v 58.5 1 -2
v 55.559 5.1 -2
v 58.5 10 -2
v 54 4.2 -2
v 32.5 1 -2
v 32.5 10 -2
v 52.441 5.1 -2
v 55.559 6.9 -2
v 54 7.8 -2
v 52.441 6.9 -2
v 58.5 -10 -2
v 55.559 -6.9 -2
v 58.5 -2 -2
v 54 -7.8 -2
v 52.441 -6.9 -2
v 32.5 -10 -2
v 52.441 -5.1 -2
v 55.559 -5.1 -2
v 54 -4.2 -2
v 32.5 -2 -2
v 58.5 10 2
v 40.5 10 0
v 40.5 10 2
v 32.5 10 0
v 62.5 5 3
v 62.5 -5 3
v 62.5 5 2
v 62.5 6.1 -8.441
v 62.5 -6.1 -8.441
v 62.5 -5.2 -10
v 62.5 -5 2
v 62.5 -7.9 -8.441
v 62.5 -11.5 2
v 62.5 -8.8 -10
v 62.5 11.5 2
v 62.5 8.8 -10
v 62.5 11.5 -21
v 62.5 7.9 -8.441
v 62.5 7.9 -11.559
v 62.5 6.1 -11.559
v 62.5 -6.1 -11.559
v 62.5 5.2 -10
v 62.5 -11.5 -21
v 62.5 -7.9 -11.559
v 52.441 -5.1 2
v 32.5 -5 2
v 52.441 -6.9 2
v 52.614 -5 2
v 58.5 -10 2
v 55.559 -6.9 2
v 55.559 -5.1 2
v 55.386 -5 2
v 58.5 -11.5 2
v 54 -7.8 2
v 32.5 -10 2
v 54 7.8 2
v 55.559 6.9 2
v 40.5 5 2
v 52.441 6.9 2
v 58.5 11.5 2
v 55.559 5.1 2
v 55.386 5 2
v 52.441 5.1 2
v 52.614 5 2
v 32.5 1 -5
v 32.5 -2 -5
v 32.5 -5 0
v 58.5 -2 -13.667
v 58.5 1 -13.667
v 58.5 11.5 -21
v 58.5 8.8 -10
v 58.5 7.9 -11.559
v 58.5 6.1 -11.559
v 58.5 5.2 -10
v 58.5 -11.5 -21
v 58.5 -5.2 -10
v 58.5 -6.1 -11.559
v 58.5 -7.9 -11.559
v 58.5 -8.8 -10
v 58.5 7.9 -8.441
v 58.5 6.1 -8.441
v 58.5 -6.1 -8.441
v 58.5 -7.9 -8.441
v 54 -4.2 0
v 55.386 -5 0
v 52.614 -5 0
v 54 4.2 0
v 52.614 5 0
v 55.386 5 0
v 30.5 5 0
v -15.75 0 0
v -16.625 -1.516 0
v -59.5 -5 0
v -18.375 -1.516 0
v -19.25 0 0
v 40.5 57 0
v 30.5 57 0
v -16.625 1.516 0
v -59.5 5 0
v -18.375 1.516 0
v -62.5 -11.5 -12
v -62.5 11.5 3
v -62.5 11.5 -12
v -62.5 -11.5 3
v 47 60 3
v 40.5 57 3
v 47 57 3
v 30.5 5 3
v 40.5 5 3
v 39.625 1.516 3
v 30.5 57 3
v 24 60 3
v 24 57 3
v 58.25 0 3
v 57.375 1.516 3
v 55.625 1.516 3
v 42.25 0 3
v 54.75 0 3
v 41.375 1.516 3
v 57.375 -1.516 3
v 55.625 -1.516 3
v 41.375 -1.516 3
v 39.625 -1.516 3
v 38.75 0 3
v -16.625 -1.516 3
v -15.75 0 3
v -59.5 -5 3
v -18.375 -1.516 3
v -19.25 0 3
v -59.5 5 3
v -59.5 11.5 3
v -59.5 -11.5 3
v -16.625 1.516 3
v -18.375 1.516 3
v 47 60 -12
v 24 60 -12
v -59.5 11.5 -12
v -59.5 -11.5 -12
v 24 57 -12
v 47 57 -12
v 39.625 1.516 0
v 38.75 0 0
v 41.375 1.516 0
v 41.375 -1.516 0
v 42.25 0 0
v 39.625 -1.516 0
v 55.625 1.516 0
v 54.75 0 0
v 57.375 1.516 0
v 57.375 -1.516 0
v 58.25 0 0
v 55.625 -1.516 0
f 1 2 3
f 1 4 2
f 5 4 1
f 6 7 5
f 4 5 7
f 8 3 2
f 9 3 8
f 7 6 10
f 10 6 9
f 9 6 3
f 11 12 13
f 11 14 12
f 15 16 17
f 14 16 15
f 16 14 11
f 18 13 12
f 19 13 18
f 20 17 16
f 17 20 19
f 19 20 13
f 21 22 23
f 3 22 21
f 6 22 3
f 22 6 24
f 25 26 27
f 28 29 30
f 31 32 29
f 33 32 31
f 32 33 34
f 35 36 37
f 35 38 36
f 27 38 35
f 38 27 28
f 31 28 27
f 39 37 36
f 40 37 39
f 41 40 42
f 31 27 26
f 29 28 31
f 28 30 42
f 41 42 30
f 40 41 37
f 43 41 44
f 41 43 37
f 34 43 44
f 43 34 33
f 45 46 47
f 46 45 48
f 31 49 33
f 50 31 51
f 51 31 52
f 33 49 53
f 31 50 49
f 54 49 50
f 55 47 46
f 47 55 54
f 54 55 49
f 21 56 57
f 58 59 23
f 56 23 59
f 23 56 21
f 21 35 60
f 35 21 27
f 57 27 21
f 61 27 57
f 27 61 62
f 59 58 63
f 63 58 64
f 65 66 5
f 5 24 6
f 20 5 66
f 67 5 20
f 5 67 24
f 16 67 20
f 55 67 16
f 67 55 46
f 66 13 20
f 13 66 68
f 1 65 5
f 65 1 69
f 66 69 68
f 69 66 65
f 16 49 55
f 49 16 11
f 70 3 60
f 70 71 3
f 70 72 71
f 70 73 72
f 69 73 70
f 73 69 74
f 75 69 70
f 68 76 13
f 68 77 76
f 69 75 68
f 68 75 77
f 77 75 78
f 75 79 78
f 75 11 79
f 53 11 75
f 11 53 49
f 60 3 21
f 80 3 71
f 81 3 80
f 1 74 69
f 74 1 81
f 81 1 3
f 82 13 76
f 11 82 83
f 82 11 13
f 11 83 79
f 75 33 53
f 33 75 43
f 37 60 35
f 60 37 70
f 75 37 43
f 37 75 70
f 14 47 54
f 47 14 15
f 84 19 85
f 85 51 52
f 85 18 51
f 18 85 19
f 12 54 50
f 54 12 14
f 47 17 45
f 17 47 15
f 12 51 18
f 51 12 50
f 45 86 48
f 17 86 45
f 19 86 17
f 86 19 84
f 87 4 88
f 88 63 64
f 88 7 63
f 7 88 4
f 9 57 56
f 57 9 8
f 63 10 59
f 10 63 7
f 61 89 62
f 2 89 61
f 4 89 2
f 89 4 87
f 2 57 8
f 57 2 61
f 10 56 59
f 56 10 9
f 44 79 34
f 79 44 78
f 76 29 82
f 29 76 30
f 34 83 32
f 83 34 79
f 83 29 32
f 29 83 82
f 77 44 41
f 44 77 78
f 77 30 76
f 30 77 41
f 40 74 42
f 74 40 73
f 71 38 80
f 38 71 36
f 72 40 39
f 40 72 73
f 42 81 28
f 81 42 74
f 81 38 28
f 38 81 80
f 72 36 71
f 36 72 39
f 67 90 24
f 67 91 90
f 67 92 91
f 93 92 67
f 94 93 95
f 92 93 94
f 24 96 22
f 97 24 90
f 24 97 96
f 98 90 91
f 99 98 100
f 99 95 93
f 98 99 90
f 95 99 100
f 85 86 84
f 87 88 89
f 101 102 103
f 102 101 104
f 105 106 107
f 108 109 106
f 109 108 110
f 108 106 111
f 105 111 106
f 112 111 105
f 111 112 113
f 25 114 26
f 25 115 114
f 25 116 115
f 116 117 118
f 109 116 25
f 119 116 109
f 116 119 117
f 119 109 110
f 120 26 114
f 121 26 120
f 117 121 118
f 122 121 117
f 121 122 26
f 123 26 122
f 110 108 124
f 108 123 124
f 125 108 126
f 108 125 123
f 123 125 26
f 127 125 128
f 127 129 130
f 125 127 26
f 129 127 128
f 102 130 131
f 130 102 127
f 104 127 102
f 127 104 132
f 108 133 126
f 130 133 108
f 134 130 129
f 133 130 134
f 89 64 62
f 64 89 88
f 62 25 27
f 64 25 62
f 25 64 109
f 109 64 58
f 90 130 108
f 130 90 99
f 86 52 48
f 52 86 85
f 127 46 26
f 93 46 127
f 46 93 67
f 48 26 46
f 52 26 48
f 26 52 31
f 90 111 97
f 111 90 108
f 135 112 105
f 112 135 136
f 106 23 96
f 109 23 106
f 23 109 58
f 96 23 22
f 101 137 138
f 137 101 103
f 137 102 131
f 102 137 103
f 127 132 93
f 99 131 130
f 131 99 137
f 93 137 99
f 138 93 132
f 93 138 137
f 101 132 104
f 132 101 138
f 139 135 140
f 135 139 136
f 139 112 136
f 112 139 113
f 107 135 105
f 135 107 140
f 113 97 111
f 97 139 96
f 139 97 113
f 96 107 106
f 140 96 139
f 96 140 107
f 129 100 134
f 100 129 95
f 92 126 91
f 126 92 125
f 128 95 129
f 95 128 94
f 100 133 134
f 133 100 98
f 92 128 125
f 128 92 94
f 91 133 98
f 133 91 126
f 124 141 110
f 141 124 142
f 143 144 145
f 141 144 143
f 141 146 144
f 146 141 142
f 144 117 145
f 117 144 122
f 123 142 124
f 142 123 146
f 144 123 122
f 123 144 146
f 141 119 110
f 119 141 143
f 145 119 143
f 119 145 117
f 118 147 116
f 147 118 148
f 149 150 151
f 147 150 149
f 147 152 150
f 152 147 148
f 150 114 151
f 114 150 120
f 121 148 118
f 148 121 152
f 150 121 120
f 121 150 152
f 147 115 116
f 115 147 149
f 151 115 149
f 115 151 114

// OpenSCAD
body_size = [125, 10, 3];
body2_size = [10, 60+body_size.y/2, 3];
mount_size = [3, 23, 15];
mount2_size = [23, 3, 15];

mount_holes = [[-6, 8.5, 0], [-6, 8.5 + 104, 0], [6, 8.5, 0], [6, 8.5 + 104, 0]];
bottom_mount_holes = [[-7, 0, -8], [7, 0, -8]];

holes_positions = [
    [45-body_size.x/2, 0, 0],
    [103-body_size.x/2, 0, 0],
    [body_size.x/2 - 6, 0, 0],
];

module body(size) {
    linear_extrude(size.z)
    square([size.x, size.y], center=true);
}

difference() {
    union() {
        rotate([0, 0, 90])
        translate([0, -body_size.x/2, 0])
        mount_line();
        body(body_size);
        translate([98-body_size.x/2, (body2_size.y-body_size.y)/2, 0])
        body(body2_size);
        translate([(mount_size.x-body_size.x)/2, 0, body_size.z-mount_size.z])
        body(mount_size);
        #translate([98-body_size.x/2, (body2_size.y-body_size.y/2-mount2_size.y/2), body_size.z-mount_size.z])
        body(mount2_size);
    }
    for (pos = holes_positions) {
            translate(pos)
            linear_extrude(body_size.z)
            circle(d=3.5);
    }
}

module pletwa(h1, h2, t) {
    translate([0, 0, -2])
    linear_extrude(height=t)
    polygon([[0, 0], [0, 30], [h2, 30], [h1, 0]]);
}

module bottom_mount() {
    rotate([90, 0, 0])
    translate([0, (-23 + 4)/2, -4])
    linear_extrude(height=4)  
    square([23, 23], center=true);
}

module body_line() {
    pletwa(h1=10, h2=10, t=4);
    rotate([0, 90, 0])
    pletwa(h1=15, h2=5, t=3);
    rotate([0, 180, 0])
    pletwa(h1=10, h2=10, t=4);
    bottom_mount();
}

module mount_line() {
    difference() {
        body_line();
        
        for (pos = mount_holes) {
            translate(pos)
            translate([0, 0, -2])
            linear_extrude(4)
            circle(d=3.6);
        }
        
        for (pos = bottom_mount_holes) {
            translate(pos)
            translate([0, 0, -2])
            rotate([270, 0, 0])
            linear_extrude(4)
            circle(d=3.6);
        }
    }
}
